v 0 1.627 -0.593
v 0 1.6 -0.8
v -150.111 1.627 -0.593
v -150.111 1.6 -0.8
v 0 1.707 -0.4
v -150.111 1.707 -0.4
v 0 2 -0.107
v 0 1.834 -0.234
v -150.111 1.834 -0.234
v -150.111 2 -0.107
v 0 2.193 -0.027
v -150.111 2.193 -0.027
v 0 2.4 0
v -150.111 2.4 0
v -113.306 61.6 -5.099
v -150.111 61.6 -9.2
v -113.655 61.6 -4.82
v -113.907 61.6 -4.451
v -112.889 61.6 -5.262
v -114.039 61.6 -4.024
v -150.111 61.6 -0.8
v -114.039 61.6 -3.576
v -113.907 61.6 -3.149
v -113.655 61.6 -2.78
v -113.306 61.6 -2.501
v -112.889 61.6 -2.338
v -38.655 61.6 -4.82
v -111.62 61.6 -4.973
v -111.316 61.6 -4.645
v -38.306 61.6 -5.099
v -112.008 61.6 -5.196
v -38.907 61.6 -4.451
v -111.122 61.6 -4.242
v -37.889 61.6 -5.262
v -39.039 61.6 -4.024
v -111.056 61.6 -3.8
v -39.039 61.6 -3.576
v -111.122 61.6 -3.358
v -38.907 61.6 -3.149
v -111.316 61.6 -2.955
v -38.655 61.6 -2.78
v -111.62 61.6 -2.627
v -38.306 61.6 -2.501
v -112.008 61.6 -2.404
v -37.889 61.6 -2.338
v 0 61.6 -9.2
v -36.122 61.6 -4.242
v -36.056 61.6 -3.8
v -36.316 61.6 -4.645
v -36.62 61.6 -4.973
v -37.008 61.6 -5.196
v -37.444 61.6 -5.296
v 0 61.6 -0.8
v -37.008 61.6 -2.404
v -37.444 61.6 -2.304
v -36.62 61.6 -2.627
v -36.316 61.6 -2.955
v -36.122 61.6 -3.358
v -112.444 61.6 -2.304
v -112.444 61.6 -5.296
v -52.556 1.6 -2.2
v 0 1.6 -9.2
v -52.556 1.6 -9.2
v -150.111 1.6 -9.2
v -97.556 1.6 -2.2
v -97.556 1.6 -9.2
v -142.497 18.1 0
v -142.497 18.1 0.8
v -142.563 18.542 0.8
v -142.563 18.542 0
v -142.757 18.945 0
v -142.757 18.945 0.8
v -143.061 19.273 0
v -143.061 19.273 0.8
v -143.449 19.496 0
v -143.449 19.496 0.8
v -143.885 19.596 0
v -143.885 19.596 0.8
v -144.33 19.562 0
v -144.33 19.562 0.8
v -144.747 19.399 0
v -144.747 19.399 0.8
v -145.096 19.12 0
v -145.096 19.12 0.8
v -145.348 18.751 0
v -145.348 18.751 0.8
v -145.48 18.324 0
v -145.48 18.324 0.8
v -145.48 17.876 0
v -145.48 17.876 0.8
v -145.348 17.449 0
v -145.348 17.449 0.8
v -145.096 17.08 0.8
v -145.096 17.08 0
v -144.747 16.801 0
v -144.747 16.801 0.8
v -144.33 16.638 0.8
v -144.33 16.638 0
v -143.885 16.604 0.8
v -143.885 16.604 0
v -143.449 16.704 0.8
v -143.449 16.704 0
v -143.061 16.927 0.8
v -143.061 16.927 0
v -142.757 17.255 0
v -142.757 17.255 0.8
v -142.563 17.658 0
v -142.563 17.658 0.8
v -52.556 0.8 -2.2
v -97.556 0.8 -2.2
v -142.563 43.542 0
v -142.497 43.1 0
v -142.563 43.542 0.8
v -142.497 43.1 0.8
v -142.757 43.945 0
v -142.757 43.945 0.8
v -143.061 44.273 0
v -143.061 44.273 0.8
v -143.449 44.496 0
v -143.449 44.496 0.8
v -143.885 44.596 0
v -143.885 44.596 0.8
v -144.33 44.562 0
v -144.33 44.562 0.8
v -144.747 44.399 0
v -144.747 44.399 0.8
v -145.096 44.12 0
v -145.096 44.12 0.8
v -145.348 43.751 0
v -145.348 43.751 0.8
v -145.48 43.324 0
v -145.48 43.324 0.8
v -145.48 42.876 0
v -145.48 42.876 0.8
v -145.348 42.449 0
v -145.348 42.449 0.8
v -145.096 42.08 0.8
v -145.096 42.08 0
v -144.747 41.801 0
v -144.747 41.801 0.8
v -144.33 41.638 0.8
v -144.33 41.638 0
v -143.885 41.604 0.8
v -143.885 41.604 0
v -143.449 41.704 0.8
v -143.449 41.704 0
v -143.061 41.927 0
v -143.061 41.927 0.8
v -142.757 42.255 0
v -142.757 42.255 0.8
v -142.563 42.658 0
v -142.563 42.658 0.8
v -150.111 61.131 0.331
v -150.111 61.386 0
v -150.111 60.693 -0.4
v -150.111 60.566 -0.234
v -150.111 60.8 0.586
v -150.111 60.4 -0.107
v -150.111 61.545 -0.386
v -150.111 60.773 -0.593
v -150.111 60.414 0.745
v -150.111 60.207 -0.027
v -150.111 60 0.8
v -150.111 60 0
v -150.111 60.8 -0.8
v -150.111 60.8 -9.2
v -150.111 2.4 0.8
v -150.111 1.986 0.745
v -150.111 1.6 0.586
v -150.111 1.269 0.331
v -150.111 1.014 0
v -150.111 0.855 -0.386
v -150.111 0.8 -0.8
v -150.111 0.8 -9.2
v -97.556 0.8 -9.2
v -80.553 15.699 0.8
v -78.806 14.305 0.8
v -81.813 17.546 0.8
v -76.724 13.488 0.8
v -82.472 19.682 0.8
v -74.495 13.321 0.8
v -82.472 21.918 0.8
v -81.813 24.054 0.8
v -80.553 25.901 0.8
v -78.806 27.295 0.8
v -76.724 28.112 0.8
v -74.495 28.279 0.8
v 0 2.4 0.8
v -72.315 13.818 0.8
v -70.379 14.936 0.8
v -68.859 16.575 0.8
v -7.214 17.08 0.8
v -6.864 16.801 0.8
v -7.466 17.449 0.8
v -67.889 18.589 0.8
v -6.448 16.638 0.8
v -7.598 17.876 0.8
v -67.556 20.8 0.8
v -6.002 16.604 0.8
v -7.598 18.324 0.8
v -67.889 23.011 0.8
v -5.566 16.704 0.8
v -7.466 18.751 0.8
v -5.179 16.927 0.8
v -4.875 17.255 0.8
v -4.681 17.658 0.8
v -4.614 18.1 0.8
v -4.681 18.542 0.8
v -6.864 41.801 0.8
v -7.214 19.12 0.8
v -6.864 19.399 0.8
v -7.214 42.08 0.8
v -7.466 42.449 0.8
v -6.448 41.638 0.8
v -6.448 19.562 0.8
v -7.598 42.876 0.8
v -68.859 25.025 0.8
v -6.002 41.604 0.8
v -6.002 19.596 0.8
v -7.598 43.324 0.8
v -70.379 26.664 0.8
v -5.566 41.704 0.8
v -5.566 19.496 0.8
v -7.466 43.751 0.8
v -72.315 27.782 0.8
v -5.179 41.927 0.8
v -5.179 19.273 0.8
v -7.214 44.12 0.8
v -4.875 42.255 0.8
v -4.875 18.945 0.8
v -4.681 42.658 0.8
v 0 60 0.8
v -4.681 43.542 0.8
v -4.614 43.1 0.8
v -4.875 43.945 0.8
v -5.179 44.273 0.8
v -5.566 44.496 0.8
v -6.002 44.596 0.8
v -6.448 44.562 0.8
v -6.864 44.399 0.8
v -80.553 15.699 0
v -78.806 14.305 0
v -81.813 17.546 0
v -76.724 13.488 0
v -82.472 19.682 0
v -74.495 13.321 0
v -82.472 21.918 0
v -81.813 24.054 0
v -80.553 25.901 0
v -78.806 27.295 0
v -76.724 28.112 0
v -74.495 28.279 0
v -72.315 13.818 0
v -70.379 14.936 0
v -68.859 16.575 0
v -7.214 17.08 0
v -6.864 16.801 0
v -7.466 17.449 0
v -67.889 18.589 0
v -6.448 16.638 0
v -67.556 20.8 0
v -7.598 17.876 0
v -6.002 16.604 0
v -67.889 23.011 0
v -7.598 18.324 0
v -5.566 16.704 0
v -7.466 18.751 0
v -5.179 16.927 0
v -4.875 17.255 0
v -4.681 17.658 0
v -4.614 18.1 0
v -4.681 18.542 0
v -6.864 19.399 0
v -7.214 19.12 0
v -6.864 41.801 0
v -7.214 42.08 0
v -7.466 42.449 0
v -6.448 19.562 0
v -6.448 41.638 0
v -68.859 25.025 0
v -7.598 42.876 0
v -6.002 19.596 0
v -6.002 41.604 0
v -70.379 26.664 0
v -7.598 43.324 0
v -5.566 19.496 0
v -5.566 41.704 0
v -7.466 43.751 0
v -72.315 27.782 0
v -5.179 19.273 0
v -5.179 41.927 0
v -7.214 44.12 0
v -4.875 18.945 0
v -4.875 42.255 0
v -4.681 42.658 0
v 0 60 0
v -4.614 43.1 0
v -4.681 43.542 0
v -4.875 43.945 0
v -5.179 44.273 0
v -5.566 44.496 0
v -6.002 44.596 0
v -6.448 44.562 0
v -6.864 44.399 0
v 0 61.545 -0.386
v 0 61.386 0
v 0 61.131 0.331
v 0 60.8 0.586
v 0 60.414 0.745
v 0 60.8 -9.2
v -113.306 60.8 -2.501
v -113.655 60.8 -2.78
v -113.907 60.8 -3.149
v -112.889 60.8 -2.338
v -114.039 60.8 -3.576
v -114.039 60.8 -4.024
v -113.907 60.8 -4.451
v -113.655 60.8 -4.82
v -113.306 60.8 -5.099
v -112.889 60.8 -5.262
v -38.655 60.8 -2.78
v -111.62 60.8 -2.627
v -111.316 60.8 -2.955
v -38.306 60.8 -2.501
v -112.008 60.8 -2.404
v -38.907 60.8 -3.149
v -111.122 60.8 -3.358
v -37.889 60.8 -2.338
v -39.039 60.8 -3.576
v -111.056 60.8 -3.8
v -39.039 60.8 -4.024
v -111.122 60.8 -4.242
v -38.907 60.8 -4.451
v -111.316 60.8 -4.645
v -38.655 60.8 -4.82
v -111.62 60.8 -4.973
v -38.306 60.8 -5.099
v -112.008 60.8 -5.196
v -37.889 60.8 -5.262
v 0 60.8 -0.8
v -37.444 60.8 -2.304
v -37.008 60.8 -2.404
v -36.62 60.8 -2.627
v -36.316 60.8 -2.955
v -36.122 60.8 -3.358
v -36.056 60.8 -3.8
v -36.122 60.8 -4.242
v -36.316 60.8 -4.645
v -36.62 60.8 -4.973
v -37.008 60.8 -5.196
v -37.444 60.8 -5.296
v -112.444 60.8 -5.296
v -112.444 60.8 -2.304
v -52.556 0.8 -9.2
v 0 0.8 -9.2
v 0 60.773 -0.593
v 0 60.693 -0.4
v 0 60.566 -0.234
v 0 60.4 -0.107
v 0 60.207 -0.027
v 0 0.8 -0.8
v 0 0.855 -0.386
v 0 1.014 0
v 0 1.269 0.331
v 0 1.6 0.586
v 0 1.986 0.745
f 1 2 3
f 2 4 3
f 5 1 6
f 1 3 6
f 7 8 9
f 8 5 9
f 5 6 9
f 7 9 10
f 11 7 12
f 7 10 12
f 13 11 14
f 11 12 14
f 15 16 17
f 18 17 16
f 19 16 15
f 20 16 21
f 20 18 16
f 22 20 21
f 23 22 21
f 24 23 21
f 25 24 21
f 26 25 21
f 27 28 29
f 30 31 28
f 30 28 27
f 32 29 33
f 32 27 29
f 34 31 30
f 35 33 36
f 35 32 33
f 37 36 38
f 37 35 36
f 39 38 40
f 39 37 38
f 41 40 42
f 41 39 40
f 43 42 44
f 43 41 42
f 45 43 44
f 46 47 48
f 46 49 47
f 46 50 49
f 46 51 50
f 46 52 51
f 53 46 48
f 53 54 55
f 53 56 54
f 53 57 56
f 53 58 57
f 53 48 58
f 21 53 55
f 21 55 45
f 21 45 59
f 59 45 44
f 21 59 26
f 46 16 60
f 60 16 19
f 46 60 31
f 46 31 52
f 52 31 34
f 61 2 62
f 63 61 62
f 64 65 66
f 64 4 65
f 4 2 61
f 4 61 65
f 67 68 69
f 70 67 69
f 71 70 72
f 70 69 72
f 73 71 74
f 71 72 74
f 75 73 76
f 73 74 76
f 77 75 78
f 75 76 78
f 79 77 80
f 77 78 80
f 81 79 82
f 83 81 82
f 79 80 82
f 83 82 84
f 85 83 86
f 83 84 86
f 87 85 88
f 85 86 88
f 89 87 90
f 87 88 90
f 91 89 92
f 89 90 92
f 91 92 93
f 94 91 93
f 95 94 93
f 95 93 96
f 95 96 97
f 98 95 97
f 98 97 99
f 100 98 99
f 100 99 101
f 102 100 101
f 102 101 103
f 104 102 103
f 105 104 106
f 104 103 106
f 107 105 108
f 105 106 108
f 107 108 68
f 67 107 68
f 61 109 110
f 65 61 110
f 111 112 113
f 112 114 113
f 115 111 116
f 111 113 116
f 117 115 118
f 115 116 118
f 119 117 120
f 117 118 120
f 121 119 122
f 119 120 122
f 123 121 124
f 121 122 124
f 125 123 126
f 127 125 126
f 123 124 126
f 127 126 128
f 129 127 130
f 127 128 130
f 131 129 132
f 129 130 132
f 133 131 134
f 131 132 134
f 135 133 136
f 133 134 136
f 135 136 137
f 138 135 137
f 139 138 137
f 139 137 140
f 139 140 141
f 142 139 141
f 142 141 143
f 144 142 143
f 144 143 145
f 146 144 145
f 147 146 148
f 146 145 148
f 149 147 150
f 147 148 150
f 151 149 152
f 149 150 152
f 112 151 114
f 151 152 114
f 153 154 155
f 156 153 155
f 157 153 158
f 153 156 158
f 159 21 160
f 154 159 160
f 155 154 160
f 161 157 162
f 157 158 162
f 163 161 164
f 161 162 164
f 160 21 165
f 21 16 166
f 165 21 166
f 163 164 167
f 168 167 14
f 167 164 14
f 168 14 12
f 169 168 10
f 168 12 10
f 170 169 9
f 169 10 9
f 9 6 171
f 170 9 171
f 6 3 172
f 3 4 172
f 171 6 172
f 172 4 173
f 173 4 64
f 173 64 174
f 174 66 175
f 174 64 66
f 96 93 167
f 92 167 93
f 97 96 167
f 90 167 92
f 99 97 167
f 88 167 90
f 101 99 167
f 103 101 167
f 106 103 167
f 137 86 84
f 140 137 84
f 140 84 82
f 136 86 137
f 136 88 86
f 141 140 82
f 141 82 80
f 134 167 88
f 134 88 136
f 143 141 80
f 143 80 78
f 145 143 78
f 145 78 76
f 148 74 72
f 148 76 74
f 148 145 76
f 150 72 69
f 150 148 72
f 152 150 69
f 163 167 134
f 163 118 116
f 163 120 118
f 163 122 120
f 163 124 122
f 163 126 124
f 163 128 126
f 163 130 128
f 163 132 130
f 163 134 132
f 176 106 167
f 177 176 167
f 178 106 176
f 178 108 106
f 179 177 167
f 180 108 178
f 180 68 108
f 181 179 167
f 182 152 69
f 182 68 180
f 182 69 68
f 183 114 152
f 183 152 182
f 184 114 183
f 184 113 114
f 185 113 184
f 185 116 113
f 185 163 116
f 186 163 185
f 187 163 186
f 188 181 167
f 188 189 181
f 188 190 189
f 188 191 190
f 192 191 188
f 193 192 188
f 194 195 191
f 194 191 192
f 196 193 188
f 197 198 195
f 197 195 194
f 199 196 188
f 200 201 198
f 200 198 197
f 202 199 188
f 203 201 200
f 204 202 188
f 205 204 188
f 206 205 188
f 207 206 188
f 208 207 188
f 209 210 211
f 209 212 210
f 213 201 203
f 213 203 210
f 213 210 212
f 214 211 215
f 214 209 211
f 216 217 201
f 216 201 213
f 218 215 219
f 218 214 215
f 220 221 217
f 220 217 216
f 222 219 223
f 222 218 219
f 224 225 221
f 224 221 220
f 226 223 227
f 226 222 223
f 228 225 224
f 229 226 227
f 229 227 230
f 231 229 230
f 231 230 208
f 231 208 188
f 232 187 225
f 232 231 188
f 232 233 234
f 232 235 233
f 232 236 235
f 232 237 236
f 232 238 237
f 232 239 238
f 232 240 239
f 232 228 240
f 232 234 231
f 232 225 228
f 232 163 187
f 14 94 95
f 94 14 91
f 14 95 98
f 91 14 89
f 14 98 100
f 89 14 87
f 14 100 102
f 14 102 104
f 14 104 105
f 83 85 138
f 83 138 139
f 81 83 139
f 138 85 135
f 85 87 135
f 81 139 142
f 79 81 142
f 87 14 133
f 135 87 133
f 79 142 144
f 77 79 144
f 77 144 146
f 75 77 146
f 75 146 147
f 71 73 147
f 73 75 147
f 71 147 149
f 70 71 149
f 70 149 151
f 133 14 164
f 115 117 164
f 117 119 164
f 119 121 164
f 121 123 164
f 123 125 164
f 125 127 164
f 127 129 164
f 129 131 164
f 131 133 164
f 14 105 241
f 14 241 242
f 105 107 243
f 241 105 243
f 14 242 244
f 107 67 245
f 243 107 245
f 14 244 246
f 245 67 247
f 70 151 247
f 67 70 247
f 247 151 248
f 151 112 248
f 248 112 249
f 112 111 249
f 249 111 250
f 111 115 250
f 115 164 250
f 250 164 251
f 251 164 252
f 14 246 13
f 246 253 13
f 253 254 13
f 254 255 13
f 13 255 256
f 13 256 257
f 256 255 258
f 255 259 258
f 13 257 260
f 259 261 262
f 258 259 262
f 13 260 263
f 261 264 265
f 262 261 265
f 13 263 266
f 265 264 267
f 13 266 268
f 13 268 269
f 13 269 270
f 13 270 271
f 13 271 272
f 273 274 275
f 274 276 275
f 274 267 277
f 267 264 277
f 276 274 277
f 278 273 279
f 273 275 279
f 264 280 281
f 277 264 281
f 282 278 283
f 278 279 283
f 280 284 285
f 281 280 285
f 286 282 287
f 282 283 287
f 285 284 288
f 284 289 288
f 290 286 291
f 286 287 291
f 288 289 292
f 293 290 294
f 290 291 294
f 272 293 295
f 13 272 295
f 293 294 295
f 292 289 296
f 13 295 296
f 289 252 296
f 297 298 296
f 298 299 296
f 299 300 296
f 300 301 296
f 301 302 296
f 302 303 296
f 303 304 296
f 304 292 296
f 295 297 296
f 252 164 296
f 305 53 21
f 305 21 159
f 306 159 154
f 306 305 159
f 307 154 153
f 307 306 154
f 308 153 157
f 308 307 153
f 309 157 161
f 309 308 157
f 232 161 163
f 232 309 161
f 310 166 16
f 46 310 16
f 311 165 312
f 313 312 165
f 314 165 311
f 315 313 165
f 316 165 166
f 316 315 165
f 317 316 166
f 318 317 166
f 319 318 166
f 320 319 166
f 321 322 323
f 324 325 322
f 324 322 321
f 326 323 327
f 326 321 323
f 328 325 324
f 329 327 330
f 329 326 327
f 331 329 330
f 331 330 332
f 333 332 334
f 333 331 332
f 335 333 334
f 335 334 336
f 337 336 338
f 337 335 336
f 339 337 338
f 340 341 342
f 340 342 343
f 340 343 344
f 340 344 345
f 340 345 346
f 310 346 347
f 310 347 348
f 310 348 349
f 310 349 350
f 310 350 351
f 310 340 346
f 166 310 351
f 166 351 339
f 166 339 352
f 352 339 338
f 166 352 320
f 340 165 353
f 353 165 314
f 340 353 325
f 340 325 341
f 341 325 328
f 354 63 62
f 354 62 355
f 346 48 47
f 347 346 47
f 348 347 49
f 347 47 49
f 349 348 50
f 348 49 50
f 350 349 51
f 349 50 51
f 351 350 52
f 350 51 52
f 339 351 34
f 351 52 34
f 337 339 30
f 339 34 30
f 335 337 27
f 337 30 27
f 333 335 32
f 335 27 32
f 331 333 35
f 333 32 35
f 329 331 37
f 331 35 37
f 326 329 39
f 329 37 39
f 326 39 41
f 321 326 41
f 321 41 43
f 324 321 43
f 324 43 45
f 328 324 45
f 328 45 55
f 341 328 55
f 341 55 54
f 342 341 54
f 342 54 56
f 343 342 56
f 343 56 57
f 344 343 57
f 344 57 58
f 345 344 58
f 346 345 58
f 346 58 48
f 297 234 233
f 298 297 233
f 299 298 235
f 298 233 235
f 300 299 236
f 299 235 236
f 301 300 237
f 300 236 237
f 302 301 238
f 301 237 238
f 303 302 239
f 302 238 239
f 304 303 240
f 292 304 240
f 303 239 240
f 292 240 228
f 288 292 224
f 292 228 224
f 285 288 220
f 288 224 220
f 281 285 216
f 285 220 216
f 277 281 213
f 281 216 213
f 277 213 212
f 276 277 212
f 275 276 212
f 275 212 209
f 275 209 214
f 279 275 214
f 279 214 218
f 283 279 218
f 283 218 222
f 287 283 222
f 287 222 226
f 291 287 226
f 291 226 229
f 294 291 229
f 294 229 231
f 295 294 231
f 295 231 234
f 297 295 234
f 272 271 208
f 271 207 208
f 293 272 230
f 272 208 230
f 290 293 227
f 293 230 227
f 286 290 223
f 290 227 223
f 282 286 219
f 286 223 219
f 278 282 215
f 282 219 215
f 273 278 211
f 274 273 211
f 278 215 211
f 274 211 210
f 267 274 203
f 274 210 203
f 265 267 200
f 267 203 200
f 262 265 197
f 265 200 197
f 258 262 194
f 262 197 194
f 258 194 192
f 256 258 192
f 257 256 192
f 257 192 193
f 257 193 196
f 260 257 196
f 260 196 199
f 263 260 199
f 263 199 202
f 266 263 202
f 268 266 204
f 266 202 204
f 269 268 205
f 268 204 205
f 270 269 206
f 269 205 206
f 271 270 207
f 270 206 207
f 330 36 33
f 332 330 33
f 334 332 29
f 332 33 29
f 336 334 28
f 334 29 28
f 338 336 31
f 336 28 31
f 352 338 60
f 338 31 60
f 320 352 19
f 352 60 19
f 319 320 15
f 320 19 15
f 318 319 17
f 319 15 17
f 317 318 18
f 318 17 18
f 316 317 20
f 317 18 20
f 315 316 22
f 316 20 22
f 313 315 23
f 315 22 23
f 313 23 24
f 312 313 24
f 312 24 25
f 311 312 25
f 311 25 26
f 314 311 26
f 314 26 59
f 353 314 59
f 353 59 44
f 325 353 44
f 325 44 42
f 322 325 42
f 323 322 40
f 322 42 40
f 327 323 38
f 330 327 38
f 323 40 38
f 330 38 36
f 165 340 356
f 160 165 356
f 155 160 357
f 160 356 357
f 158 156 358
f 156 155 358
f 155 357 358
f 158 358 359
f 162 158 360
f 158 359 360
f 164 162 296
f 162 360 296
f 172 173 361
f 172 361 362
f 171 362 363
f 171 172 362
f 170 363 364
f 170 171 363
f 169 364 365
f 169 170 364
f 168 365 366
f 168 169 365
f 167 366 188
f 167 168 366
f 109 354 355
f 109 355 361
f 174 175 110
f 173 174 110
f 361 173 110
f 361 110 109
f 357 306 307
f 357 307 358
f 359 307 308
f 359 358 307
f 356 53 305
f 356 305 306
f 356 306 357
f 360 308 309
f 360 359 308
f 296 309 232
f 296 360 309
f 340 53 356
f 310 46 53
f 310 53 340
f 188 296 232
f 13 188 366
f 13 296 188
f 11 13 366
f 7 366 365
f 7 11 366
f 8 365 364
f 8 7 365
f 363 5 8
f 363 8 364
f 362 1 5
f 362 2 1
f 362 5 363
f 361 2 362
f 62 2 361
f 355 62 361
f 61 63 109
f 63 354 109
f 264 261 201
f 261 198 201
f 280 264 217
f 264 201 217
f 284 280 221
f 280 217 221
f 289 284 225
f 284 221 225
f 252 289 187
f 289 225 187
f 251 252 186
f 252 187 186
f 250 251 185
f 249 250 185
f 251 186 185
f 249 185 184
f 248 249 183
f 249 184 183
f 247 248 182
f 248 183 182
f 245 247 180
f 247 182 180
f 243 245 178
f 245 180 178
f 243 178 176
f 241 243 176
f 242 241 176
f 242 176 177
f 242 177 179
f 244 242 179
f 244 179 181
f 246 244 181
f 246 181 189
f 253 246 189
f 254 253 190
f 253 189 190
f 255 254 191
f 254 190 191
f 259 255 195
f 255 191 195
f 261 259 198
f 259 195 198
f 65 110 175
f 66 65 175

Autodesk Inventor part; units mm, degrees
ref_plane "YZ Plane" through (0, 0, 0) normal (1, 0, 0) x (0, 1, 0)
ref_plane "XZ Plane" through (0, 0, 0) normal (0, 1, 0) x (-1, 0, 0)
ref_plane "XY Plane" through (0, 0, 0) normal (0, 0, 1) x (1, 0, 0)
ref_plane "Płaszczyzna konstrukcyjna1" through (0, 0, 0) normal (0, 0, 1) x (1, 0, 0)
sketch "Szkic2" plane through (0, 0, 0) normal (0, 0, 1) x (1, 0, 0)
  line L0 (0, 0.8) -> (-150.1111, 0.8)
  line L1 (-150.1111, 0) -> (-150.1111, 0.8)
  line L2 (0, 0) -> (-150.1111, 0)
  line L3 (0, 0) -> (0, 0.8)
  line L4 (-150.1111, 0) -> (0, 0)
  line L5 (0, 0) -> (0, 60)
  line L6 (0, 60) -> (-150.1111, 60)
  line L7 (-150.1111, 60) -> (-150.1111, 0)
  dimension "d0" = 60
extrude "Płyta1" add sketch "Szkic2" along normal blind 0.8 contours L0 L7 L6 L5
sketch "Szkic3" plane through (-150.1111, 1.6, 0.8) normal (0, -1, 0) x (1, 0, 0)
  line L0 (150.1111, 0) -> (0, 0)
  line L1 (0, 0) -> (0, -10)
  line L2 (0, -10) -> (150.1111, -10)
  line L3 (150.1111, -10) -> (150.1111, 0)
edge flange "Kołnierz1" height 10 angle 90 thickness 0.8 bend radius 0.8 thickness toward (0, -1, 0) relief straight relief width 0.8 relief depth 0.4 edges at (-75.0555, 0.8, 0) wall of the first edge with corners at (0, 1.6, 0.8) (-150.1111, 1.6, 0.8) (-150.1111, 1.6, -9.2) (0, 1.6, -9.2)
bend "Gięcie1"
corner "Narożnik1"
sketch "Szkic4" plane through (0, 60.8, -0.8) normal (0, 1, 0) x (-1, 0, 0)
  line L0 (150.1111, 0) -> (0, 0)
  line L1 (0, 0) -> (0, -8.4)
  line L2 (0, -8.4) -> (150.1111, -8.4)
  line L3 (150.1111, -8.4) -> (150.1111, 0)
edge flange "Kołnierz2" height 10 angle 90 thickness 0.8 bend radius 0.8 thickness toward (0, 1, 0) relief straight relief width 0.8 relief depth 0.4 edges at (-75.0555, 60, 0) wall of the first edge with corners at (-150.1111, 60.8, -0.8) (0, 60.8, -0.8) (0, 60.8, -9.2) (-150.1111, 60.8, -9.2)
bend "Gięcie2"
corner "Narożnik2"
sketch "Szkic5" plane through (-150.1111, 0.8, -9.2) normal (0, -1, 0) x (1, 0, 0)
  line L0 (150.1111, 0) -> (0, 0) projected
  line L1 (0, 0) -> (150.1111, 0) construction
  line L2 (75.0555, 0) -> (75.0555, 31.3517) construction
  line L3 (52.5555, 0) -> (97.5555, 0)
  line L4 (97.5555, 0) -> (97.5555, 7)
  line L5 (97.5555, 7) -> (52.5555, 7)
  line L6 (52.5555, 7) -> (52.5555, 0)
  point P0 (150.1111, 9.2)
  dimension "d22" = 7
  dimension "d23" = 45
extrude "Wytnij1" cut sketch "Szkic5" against normal blind 0.8
sketch "Szkic6" plane through (-150.1111, 61.6, -9.2) normal (0, 1, 0) x (1, 0, 0)
  circle A0 centre (37.5555, -5.4) radius 1.5 projected
  circle A1 centre (112.5555, -5.4) radius 1.5 projected
  point P0 (150.1111, -9.2)
extrude "Wytnij2" cut sketch "Szkic6" against normal blind 0.8
sketch "Szkic7" plane through (0, 0, 0.8) normal (0, 0, 1) x (1, 0, 0)
  circle A0 centre (-143.9967, 43.1) radius 1.5 projected
  circle A1 centre (-143.9967, 18.1) radius 1.5 projected
  circle A2 centre (-6.1144, 18.1) radius 1.5 projected
  circle A3 centre (-6.1144, 43.1) radius 1.5 projected
  point P0 (0, 0)
extrude "Wytnij3" cut sketch "Szkic7" against normal blind 0.8
sketch "Szkic8" plane through (0, 0, 0.8) normal (0, 0, 1) x (1, 0, 0)
  circle A0 centre (-75.0555, 20.8) radius 7.5
  point P0 (0, 0)
  dimension "d30" = 15
extrude "Wytnij4" cut sketch "Szkic8" against normal blind 0.8
equation "\"d24\" = Grubość"
equation "\"d26\" = Grubość"
equation "\"d28\" = Grubość"
equation "\"d31\" = Grubość"
equation "\"d2\" = SzerokośćGięciaPodcięcia"
equation "\"d3\" = GłębokośćGięciaPodcięcia"
equation "\"d4\" = MinimalnaPozostałość"
equation "\"d5\" = PromieńGięcia"
equation "\"d8\" = PromieńGięcia"
equation "\"d9\" = RozmiarPodcięciaNarożnika"
equation "\"d10\" = Wielk_odstępu"
equation "\"d11\" = Rozmiar_promienia_Jacobiego"
equation "\"d12\" = SzerokośćGięciaPodcięcia"
equation "\"d13\" = GłębokośćGięciaPodcięcia"
equation "\"d14\" = MinimalnaPozostałość"
equation "\"d15\" = PromieńGięcia"
equation "\"d18\" = PromieńGięcia"
equation "\"d19\" = RozmiarPodcięciaNarożnika"
equation "\"d20\" = Wielk_odstępu"
equation "\"d21\" = Rozmiar_promienia_Jacobiego"
equation "\"PromieńGięcia\" = Grubość"
equation "\"SzerokośćGięciaPodcięcia\" = Grubość"
equation "\"GłębokośćGięciaPodcięcia\" = 0.5 * Grubość"
equation "\"RozmiarPodcięciaNarożnika\" = 4 * Grubość"
equation "\"MinimalnaPozostałość\" = 2 * Grubość"
equation "\"PromieńPrzejścia\" = PromieńGięcia"
equation "\"Rozmiar_promienia_Jacobiego\" = Grubość"
equation "\"Wielk_odstępu\" = Grubość"
equation "\"d1\" = PromieńGięcia"
equation "\"Grubość\" = 0.8"
properties part number "base_side_constr"
